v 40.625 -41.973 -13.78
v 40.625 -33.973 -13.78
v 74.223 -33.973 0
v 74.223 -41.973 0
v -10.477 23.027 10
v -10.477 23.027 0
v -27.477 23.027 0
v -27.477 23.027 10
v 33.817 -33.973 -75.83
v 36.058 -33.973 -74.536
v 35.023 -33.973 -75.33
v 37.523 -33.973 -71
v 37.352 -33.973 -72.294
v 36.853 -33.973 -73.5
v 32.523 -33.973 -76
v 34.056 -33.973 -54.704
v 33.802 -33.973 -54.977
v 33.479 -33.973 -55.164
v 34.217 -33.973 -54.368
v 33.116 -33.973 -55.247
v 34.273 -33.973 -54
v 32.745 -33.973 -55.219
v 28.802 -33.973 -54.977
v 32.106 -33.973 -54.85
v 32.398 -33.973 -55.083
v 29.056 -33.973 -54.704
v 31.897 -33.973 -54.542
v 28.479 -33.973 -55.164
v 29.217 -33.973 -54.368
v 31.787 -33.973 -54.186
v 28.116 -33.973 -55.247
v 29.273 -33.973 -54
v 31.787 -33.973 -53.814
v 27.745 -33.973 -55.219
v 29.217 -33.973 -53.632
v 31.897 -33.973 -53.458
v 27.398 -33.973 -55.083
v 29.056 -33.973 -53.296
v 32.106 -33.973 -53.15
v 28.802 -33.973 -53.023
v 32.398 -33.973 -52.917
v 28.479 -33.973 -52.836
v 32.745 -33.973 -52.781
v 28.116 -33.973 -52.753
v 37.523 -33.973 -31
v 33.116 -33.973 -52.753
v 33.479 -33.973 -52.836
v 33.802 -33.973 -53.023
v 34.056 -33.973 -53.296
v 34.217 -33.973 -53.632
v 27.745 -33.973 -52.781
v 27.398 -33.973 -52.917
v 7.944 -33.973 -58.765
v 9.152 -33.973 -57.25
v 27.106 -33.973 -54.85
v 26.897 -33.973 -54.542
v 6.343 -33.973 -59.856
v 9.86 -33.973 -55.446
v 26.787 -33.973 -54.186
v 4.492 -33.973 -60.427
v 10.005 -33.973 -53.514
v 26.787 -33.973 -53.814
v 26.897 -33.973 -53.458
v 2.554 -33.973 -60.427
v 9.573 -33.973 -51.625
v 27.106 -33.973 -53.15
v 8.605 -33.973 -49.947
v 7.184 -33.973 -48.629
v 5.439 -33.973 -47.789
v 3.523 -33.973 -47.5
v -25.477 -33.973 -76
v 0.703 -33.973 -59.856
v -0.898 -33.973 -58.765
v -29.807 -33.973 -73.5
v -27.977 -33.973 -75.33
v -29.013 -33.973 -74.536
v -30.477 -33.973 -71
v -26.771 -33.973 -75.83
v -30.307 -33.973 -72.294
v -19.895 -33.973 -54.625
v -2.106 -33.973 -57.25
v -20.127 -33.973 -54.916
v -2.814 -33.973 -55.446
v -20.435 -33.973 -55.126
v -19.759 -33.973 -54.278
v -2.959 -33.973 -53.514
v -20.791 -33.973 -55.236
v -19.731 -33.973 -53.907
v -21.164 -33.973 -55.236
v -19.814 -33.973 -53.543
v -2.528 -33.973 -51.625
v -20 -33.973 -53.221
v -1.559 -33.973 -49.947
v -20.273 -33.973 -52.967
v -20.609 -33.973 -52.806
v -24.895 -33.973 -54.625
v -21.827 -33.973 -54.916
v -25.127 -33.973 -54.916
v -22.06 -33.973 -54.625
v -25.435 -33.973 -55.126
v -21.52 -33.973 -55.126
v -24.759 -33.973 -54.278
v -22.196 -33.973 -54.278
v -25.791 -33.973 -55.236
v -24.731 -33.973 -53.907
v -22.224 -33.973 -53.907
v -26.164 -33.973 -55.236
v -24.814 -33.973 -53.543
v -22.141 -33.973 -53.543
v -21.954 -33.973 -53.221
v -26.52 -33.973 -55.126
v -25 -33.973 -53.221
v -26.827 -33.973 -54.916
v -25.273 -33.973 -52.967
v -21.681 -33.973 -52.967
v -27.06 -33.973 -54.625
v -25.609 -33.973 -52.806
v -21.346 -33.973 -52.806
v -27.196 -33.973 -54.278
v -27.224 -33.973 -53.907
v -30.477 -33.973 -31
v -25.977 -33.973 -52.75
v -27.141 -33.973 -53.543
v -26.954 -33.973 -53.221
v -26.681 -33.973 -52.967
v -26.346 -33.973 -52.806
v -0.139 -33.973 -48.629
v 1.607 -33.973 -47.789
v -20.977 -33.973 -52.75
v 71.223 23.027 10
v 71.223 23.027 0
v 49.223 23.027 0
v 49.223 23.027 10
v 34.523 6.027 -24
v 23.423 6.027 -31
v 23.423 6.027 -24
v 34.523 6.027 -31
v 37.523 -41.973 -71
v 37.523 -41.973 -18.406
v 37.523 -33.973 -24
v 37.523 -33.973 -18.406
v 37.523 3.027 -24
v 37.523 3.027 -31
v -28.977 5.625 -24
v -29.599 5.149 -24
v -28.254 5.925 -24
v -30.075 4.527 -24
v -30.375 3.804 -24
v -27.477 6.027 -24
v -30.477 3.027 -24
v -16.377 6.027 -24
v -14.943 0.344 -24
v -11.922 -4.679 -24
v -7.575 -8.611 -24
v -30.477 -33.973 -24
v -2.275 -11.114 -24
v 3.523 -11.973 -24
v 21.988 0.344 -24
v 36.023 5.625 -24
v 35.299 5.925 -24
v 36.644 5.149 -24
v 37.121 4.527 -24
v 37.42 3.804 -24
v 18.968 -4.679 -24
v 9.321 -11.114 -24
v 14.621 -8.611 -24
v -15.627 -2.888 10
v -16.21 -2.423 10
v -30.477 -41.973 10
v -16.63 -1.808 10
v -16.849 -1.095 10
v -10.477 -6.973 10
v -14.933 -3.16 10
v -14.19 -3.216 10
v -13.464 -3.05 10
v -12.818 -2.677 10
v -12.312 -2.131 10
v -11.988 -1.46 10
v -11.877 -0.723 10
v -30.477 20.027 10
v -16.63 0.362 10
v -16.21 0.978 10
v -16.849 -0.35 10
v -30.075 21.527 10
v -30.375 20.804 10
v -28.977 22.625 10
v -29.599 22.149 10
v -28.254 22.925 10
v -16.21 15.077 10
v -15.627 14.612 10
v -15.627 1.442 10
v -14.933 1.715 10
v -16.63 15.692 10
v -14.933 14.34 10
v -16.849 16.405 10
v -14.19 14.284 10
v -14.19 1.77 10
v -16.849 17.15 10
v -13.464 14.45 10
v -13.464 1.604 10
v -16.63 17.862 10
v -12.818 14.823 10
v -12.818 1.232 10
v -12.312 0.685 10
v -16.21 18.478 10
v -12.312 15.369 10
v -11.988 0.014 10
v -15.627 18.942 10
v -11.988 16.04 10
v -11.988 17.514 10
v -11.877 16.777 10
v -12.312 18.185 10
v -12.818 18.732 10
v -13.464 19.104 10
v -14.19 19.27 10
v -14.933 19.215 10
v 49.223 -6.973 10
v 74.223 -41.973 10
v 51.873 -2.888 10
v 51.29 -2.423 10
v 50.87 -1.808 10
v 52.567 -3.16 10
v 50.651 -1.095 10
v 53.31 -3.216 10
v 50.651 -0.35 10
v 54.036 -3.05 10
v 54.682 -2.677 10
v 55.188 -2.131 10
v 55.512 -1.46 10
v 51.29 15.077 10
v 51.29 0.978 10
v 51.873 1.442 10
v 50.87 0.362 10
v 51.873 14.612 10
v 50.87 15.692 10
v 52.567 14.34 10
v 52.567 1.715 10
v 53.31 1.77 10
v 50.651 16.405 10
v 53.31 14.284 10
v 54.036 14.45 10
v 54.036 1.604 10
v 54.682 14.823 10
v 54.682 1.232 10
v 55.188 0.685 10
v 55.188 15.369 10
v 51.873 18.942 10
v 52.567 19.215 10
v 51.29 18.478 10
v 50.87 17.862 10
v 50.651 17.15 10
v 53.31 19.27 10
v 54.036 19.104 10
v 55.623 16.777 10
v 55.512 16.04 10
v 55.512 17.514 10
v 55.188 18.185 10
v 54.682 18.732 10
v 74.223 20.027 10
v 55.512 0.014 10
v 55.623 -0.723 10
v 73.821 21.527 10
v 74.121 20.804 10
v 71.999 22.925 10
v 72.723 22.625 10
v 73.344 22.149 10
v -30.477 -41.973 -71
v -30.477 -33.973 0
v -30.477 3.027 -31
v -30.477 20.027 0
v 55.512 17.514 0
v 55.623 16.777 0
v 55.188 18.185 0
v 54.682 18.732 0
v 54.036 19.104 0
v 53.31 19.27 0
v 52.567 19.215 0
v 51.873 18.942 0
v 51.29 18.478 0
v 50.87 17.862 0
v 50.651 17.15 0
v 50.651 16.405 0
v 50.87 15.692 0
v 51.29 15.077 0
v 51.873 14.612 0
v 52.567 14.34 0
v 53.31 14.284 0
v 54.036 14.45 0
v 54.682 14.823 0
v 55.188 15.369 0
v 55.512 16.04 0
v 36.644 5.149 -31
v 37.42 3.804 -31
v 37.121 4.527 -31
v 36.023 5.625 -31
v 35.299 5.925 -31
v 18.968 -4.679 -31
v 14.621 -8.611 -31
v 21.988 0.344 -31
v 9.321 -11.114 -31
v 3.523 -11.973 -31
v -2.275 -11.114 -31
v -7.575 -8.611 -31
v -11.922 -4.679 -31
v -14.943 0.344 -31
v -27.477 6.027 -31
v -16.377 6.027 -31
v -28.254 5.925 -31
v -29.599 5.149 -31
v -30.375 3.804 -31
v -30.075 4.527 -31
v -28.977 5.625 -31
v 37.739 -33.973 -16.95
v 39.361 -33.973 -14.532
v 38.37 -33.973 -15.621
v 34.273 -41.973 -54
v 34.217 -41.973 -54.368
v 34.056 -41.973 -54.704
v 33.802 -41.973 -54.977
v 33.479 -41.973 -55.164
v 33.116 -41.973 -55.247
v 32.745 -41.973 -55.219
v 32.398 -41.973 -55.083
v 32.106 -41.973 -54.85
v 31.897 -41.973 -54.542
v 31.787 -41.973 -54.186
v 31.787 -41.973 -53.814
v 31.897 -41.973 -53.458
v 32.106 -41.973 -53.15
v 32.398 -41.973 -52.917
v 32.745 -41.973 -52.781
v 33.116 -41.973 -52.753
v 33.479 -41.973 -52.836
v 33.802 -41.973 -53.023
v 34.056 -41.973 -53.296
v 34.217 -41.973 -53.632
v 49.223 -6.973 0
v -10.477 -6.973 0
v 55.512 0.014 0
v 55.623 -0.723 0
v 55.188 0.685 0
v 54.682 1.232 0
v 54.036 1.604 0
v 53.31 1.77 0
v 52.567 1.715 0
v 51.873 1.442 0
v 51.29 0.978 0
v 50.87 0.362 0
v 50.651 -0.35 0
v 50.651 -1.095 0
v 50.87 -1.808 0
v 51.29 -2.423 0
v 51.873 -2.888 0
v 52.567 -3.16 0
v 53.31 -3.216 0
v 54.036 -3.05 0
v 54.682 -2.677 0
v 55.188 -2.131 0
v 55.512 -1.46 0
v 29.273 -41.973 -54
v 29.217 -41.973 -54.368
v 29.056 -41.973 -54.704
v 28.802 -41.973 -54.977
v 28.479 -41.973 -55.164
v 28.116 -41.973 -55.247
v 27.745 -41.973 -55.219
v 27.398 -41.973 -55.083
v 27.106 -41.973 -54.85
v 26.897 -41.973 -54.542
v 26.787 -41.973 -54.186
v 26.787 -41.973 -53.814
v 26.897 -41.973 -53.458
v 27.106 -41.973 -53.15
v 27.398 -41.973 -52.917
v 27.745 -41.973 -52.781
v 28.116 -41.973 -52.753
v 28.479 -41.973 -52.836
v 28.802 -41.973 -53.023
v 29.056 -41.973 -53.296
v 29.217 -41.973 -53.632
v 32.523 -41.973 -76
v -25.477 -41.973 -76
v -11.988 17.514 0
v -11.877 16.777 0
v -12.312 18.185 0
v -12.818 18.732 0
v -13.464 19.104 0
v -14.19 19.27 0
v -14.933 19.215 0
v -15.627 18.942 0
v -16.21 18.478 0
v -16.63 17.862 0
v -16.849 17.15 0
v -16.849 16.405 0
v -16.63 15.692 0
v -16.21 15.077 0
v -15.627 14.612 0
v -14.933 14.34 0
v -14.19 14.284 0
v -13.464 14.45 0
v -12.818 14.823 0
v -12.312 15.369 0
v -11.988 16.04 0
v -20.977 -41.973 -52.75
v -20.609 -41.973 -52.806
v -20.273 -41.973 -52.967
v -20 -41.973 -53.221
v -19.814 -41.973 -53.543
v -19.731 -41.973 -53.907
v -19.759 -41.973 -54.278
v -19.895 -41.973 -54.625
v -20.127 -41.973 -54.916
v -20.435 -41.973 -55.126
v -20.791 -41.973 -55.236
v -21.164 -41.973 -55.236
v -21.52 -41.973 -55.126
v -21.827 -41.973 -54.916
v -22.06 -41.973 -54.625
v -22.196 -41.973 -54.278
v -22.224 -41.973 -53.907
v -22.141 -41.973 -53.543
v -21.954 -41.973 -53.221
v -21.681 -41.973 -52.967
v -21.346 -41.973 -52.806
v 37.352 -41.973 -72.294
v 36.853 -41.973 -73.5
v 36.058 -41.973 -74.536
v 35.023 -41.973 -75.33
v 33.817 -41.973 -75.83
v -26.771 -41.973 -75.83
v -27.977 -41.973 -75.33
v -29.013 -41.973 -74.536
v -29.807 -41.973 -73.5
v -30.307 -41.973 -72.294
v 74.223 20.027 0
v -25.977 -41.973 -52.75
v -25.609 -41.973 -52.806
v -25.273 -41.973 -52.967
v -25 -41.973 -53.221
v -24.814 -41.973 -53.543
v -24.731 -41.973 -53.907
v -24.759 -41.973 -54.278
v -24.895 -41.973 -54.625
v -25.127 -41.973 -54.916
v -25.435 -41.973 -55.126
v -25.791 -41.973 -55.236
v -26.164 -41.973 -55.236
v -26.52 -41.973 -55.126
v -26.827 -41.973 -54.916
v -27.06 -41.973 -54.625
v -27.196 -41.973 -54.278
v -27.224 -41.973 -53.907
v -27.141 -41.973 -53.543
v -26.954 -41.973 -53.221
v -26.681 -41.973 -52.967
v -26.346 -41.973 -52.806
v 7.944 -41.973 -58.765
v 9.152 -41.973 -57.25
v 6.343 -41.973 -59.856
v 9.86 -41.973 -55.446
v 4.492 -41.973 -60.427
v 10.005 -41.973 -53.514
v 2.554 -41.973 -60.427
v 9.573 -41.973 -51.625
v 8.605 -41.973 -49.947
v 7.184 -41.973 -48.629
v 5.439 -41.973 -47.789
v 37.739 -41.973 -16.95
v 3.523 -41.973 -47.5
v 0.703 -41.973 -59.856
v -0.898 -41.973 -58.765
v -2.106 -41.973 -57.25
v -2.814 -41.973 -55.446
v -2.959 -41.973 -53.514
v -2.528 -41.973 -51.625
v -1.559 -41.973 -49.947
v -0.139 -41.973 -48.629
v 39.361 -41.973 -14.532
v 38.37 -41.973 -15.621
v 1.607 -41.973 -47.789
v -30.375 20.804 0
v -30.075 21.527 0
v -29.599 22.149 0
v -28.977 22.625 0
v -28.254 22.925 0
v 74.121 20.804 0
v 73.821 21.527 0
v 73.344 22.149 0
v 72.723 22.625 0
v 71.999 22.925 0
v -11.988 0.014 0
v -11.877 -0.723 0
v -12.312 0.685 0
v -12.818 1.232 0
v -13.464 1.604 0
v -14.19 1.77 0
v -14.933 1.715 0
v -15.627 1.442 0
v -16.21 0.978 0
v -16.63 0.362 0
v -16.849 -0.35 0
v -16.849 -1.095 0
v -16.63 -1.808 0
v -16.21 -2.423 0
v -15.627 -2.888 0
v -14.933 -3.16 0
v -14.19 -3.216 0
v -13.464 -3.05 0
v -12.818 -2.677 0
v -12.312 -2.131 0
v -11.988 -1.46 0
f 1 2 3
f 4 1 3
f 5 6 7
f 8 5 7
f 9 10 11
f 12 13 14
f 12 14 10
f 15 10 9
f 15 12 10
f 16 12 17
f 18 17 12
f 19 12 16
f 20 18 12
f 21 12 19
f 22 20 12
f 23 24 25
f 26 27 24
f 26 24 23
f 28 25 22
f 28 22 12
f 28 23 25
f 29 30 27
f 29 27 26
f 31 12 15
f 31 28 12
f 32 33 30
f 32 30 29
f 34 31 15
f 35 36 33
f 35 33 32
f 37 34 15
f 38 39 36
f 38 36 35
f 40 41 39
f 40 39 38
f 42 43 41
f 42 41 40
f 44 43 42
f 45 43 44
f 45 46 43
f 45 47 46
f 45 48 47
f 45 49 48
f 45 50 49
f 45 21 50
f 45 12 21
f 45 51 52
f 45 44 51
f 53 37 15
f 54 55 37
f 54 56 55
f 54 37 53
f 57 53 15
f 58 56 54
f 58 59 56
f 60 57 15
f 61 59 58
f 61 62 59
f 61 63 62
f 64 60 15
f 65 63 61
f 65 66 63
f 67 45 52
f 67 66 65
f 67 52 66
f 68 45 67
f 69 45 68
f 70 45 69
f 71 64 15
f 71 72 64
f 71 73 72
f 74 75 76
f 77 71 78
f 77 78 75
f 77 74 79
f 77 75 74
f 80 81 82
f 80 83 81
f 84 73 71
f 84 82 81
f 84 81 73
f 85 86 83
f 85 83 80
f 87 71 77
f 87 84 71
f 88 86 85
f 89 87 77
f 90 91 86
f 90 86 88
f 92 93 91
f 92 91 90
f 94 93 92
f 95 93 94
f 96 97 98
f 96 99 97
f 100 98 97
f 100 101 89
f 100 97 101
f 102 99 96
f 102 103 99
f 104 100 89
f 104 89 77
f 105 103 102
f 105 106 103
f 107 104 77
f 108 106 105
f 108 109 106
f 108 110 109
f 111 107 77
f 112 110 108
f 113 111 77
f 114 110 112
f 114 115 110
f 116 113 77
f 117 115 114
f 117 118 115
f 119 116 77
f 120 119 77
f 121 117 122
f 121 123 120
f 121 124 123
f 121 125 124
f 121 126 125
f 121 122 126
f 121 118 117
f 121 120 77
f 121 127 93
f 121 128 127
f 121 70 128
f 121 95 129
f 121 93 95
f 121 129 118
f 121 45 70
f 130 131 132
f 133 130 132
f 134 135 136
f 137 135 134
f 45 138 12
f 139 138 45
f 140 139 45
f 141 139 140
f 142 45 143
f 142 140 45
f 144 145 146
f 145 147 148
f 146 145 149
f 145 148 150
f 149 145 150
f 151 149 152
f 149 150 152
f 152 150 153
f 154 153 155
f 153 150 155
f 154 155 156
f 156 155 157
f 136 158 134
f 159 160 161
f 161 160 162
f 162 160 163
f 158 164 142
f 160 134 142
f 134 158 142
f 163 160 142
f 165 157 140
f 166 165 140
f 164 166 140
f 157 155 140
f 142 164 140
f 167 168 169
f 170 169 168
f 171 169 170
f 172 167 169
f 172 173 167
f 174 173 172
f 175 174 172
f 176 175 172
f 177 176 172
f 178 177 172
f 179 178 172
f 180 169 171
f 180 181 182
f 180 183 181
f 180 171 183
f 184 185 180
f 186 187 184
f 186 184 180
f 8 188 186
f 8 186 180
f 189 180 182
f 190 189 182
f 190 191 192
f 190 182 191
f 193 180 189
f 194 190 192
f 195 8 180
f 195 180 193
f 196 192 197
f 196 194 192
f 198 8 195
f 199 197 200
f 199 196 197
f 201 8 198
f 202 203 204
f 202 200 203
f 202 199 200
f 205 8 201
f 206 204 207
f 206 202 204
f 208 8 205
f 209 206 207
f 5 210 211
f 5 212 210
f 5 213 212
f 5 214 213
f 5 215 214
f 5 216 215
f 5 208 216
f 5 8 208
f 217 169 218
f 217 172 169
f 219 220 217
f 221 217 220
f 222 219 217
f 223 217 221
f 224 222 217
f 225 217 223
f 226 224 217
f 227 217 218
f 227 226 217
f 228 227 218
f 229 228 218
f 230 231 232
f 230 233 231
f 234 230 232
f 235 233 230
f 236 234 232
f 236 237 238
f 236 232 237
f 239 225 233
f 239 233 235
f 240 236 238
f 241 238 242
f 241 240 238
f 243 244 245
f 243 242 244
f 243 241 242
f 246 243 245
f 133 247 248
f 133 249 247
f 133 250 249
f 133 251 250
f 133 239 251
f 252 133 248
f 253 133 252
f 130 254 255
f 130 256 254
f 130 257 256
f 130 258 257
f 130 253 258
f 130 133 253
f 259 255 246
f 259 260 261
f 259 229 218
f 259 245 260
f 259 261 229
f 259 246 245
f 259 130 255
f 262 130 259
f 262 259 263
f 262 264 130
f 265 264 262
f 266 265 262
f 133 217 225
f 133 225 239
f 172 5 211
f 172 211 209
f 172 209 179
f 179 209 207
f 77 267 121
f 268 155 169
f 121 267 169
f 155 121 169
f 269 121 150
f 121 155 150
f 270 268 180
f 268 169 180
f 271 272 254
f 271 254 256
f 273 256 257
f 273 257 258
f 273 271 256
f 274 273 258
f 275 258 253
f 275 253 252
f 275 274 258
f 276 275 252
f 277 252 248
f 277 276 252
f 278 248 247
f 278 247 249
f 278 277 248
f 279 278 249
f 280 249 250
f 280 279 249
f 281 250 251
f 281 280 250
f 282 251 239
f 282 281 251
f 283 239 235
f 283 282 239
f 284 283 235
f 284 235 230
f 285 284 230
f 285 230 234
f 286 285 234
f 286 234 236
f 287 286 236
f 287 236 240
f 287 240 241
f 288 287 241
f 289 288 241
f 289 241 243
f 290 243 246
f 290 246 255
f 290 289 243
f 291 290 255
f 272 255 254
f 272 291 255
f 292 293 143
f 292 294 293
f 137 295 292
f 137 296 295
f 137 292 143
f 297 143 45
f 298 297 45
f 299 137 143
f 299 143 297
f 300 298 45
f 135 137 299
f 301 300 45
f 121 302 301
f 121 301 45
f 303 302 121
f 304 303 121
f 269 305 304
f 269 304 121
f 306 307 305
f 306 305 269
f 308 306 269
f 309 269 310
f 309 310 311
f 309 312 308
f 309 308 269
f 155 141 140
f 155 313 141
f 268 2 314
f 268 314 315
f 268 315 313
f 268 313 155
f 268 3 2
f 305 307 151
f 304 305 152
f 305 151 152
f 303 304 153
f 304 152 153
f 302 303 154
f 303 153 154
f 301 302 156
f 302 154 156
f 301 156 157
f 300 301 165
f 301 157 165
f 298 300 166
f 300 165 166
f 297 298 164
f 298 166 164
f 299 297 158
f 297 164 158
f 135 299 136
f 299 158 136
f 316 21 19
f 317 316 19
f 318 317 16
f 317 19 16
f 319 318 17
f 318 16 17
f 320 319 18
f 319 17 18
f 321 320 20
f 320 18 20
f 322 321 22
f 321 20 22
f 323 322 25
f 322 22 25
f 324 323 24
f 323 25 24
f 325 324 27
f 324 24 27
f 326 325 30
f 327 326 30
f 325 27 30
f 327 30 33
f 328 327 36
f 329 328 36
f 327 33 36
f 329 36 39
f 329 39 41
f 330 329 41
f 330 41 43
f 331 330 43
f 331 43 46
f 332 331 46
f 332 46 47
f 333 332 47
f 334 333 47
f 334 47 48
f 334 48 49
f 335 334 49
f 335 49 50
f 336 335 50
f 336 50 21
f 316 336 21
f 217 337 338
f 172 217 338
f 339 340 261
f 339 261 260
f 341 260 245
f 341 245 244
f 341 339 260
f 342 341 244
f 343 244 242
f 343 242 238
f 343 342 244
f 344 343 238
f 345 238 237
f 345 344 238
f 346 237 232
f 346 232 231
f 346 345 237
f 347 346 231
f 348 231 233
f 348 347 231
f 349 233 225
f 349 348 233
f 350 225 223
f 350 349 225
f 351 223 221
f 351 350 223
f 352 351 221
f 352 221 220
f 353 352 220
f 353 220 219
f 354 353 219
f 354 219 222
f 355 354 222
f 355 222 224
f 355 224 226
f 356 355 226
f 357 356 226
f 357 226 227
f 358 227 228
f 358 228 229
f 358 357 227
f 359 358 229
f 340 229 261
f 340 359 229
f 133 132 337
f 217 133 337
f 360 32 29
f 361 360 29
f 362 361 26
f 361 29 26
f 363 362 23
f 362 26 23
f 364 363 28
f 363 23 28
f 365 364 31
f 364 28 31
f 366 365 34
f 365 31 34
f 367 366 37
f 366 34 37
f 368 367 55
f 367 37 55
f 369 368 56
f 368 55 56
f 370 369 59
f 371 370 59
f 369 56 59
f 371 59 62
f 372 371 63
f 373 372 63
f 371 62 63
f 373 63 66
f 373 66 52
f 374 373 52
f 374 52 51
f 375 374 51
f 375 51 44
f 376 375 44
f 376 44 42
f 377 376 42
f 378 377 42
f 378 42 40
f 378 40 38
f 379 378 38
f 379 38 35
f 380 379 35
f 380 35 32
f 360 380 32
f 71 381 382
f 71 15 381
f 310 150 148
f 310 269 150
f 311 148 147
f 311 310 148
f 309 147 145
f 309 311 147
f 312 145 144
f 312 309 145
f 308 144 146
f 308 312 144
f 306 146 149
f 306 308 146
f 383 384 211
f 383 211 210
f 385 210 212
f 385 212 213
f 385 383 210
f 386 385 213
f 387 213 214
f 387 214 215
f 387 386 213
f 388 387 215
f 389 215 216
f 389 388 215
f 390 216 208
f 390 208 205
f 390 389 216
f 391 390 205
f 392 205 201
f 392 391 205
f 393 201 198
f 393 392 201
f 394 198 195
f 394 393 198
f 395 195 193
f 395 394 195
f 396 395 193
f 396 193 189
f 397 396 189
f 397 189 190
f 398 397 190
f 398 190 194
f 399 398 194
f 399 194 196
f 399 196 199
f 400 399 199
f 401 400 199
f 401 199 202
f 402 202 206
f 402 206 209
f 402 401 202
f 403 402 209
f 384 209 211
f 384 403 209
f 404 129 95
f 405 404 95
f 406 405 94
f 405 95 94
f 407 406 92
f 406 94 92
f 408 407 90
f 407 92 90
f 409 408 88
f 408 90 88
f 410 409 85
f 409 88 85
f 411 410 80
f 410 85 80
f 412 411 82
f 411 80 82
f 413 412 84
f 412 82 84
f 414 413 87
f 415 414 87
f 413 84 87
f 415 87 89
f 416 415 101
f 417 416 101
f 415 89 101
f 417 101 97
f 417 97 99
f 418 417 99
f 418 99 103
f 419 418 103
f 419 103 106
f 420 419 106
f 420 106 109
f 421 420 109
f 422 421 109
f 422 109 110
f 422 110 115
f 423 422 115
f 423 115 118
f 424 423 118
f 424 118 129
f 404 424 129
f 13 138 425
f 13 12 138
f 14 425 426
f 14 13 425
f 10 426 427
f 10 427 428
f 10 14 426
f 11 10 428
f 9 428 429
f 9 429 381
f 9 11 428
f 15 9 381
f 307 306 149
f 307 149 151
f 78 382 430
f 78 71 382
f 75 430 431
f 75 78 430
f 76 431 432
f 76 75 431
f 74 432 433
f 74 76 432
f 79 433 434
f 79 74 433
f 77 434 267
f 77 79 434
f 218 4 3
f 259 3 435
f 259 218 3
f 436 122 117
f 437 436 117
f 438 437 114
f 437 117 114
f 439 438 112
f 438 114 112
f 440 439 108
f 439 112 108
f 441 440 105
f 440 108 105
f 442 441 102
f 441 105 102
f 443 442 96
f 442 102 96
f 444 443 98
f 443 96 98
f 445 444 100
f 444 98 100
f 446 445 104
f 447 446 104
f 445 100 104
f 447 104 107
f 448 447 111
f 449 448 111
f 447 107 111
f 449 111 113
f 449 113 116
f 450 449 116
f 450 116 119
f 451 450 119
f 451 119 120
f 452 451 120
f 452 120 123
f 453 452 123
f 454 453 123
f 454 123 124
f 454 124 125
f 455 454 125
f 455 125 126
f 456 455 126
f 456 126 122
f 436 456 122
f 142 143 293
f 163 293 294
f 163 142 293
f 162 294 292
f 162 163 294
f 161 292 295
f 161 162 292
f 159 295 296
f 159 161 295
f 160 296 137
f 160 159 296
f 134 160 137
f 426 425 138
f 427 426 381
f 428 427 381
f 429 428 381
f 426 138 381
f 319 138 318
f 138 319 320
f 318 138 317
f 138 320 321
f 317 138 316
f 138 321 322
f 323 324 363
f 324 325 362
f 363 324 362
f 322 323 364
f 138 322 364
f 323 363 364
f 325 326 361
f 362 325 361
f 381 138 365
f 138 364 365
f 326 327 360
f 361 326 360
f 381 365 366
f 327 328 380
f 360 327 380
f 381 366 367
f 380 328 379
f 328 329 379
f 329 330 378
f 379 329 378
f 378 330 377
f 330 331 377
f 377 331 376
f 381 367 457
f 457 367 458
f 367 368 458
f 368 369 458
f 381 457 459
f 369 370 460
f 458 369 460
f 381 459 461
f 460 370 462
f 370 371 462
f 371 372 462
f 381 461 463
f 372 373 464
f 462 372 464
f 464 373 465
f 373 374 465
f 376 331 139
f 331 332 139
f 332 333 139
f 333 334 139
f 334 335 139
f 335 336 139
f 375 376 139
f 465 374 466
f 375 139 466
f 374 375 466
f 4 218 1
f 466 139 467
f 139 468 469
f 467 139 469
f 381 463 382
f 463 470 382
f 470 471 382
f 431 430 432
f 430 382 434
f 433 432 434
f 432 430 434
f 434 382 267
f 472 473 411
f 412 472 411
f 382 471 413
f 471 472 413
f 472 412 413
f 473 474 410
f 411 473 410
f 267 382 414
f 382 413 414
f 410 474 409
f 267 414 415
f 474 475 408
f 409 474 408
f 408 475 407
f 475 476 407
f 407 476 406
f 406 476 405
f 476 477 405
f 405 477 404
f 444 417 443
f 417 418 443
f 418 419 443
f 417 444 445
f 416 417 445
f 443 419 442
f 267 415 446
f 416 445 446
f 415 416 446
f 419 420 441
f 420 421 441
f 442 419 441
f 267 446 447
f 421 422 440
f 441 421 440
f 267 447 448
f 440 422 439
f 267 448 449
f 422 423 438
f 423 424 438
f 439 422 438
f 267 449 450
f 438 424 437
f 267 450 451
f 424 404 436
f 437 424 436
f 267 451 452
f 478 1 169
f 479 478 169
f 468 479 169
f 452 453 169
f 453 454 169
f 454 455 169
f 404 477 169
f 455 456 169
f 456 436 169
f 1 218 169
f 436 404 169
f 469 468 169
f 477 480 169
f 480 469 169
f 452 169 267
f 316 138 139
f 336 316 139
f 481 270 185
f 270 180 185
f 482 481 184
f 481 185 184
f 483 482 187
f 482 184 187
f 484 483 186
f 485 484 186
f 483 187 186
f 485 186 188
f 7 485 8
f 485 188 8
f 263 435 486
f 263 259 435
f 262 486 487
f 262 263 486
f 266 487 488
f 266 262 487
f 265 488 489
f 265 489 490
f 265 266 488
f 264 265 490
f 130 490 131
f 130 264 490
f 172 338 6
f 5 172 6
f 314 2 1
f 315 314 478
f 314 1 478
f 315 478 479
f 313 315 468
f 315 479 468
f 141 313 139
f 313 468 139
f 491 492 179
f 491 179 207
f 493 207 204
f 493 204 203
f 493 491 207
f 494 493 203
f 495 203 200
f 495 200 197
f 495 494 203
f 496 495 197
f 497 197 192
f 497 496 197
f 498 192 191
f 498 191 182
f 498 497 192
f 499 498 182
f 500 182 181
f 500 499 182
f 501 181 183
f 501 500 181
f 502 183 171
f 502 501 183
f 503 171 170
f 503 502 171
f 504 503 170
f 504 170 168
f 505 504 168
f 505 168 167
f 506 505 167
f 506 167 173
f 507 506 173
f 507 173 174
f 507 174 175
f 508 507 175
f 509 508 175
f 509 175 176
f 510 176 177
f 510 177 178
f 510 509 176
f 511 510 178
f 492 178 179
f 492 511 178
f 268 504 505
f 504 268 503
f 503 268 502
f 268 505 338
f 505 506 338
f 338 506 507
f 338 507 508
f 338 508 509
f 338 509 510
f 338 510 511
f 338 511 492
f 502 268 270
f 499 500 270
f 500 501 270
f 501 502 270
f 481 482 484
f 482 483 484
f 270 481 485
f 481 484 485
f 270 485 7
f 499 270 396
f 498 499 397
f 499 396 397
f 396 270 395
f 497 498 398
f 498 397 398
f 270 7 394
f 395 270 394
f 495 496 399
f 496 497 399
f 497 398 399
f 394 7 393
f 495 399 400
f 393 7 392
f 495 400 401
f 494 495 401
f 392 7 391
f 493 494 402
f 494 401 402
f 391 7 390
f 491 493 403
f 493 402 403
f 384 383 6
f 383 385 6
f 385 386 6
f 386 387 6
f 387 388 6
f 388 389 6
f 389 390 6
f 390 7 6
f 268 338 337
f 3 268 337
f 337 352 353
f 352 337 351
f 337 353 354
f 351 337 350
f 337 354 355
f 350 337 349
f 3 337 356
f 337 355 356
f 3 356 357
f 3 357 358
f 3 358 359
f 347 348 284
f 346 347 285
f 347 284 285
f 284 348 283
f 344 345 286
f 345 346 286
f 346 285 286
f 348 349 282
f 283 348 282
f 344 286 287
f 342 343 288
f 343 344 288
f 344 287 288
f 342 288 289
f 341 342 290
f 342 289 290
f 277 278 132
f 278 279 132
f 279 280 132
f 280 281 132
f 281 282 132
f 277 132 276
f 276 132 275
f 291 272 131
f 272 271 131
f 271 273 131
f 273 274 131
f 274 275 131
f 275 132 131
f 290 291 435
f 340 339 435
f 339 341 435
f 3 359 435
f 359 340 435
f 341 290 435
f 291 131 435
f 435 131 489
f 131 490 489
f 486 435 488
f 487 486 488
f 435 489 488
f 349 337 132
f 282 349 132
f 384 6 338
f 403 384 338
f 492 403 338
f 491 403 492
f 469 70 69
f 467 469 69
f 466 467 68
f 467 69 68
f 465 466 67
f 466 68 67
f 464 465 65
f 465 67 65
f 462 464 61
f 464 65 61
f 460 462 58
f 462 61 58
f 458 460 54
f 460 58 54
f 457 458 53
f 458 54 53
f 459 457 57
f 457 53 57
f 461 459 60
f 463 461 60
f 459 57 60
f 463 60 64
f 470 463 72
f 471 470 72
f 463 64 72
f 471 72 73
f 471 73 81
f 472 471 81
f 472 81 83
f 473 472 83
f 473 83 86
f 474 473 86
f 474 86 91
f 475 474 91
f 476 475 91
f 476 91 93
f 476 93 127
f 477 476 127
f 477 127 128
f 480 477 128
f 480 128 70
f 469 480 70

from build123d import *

# Parameters (mm, degrees)
CROQUIS1_R              = 2.5
SALIENTE_EXTRUIR2_DEPTH = 10
CROQUIS3_W              = 104.7
CROQUIS3_H              = 8
SALIENTE_EXTRUIR3_DEPTH = 45
CROQUIS4_W              = 104.7
CROQUIS4_H              = 7
SALIENTE_EXTRUIR4_DEPTH = 40
CROQUIS6_R              = 20
CORTAR_EXTRUIR1_DEPTH   = 92.797287028
REDONDEO2_R             = 3
CORTAR_EXTRUIR3_DEPTH   = 100.186815901
CROQUIS12_W             = 67.999748742
CROQUIS12_H             = 7
CORTAR_EXTRUIR4_DEPTH   = 104.841342675
REDONDEO5_R             = 5
CROQUIS13_W             = 67.999748742
CROQUIS13_H             = 8
CORTAR_EXTRUIR6_DEPTH   = 7
CROQUIS18_W             = 67.999748742
CROQUIS18_H             = 8
SALIENTE_EXTRUIR7_DEPTH = 45
CORTAR_EXTRUIR7_REACH   = 122.557
CROQUIS19_R             = 1.25
CROQUIS19_R_2           = 6.5
REDONDEO8_R             = 5
REDONDEO10_R            = 3


with BuildPart() as part:
    # Croquis1 → Saliente-Extruir2 (new body)
    with BuildSketch(Plane.XY):
        Polygon((74.222802753, 23.027181924), (49.222802753, 23.027181924), (49.222802753, -6.972818076), (-10.477197247, -6.972818076), (-10.477197247, 23.027181924), (-30.477197247, 23.027181924), (-30.477197247, -41.972818076), (74.222802753, -41.972818076), align=None)
        with Locations((-14.377197247, 16.777181924)):
            Circle(CROQUIS1_R, mode=Mode.SUBTRACT)
        with Locations((-14.377197247, -0.722818076)):
            Circle(CROQUIS1_R, mode=Mode.SUBTRACT)
        with Locations((53.122802753, 16.777181924)):
            Circle(CROQUIS1_R, mode=Mode.SUBTRACT)
        with Locations((53.122802753, -0.722818076)):
            Circle(CROQUIS1_R, mode=Mode.SUBTRACT)
    extrude(amount=SALIENTE_EXTRUIR2_DEPTH)

    # Croquis3 → Saliente-Extruir3 (add)
    with BuildSketch(Plane(origin=(0, 0, 0), x_dir=(-1, 0, 0), z_dir=(0, 0, -1))):
        with Locations((-21.872802753, -37.972818076)):
            Rectangle(CROQUIS3_W, CROQUIS3_H)
    extrude(amount=SALIENTE_EXTRUIR3_DEPTH)

    # Croquis4 → Saliente-Extruir4 (add)
    with BuildSketch(Plane(origin=(0, -33.972818076, 0), x_dir=(1, 0, 0), z_dir=(0, 1, 0))):
        with Locations((21.872802753, 27.5)):
            Rectangle(CROQUIS4_W, CROQUIS4_H)
    extrude(amount=SALIENTE_EXTRUIR4_DEPTH)

    # Croquis6 → Cortar-Extruir1 (cut, through all)
    with BuildSketch(Plane.XY.offset(-24)):
        with Locations((3.522802753, 8.027181924)):
            Circle(CROQUIS6_R)
    extrude(amount=-CORTAR_EXTRUIR1_DEPTH, mode=Mode.SUBTRACT)

    # Redondeo2
    redondeo2_edges = [part.edges().sort_by_distance(p)[0] for p in [
        (74.222802753, 23.027181924, 5),
        (-30.477197247, 23.027181924, 5),
    ]]
    fillet(redondeo2_edges, radius=REDONDEO2_R)

    # Croquis10 → Cortar-Extruir3 (cut, through all)
    with BuildSketch(Plane(origin=(0, 6.027181924, 0), x_dir=(1, 0, 0), z_dir=(0, 1, 0))):
        Polygon((74.222802753, 45), (37.522551495, 45), (37.522551495, 15.052232973), (74.222802753, 0), align=None)
    extrude(amount=-CORTAR_EXTRUIR3_DEPTH, mode=Mode.SUBTRACT)

    # Croquis12 → Cortar-Extruir4 (cut, through all)
    with BuildSketch(Plane(origin=(0, -33.972818076, 0), x_dir=(1, 0, 0), z_dir=(0, 1, 0))):
        with Locations((3.522677124, 41.5)):
            Rectangle(CROQUIS12_W, CROQUIS12_H)
    extrude(amount=-CORTAR_EXTRUIR4_DEPTH, mode=Mode.SUBTRACT)

    # Redondeo5
    redondeo5_edges = [part.edges().sort_by_distance(p)[0] for p in [
        (37.522551495, -37.972818076, -15.052232973),
    ]]
    fillet(redondeo5_edges, radius=REDONDEO5_R)

    # Croquis13 → Cortar-Extruir6 (cut)
    with BuildSketch(Plane(origin=(0, 0, -38), x_dir=(-1, 0, 0), z_dir=(0, 0, -1))):
        with Locations((-3.522677124, -37.972818076)):
            Rectangle(CROQUIS13_W, CROQUIS13_H)
    extrude(amount=-CORTAR_EXTRUIR6_DEPTH, mode=Mode.SUBTRACT)

    # Croquis18 → Saliente-Extruir7 (add)
    with BuildSketch(Plane(origin=(0, 0, -31), x_dir=(-1, 0, 0), z_dir=(0, 0, -1))):
        with Locations((-3.522677124, -37.972818076)):
            Rectangle(CROQUIS18_W, CROQUIS18_H)
    extrude(amount=SALIENTE_EXTRUIR7_DEPTH)

    # Croquis19 → Cortar-Extruir7 (cut, up to next)
    with BuildSketch(Plane(origin=(0, -33.972818076, 0), x_dir=(1, 0, 0), z_dir=(0, 1, 0)), mode=Mode.PRIVATE) as cortar_extruir7_sk1:
        with Locations(Location((-25.977197247, 54, 0), (0, 0, 270))):
            Circle(CROQUIS19_R)
    cortar_extruir7_tool1 = extrude(cortar_extruir7_sk1.sketch, amount=-CORTAR_EXTRUIR7_REACH, mode=Mode.PRIVATE) & part.part
    # Croquis19 → Cortar-Extruir7 (cut, up to next)
    with BuildSketch(Plane(origin=(0, -33.972818076, 0), x_dir=(1, 0, 0), z_dir=(0, 1, 0)), mode=Mode.PRIVATE) as cortar_extruir7_sk2:
        with Locations((33.022802753, 54)):
            Circle(CROQUIS19_R)
    cortar_extruir7_tool2 = extrude(cortar_extruir7_sk2.sketch, amount=-CORTAR_EXTRUIR7_REACH, mode=Mode.PRIVATE) & part.part
    # Croquis19 → Cortar-Extruir7 (cut, up to next)
    with BuildSketch(Plane(origin=(0, -33.972818076, 0), x_dir=(1, 0, 0), z_dir=(0, 1, 0)), mode=Mode.PRIVATE) as cortar_extruir7_sk3:
        with Locations(Location((-20.977197247, 54, 0), (0, 0, 270))):
            Circle(CROQUIS19_R)
    cortar_extruir7_tool3 = extrude(cortar_extruir7_sk3.sketch, amount=-CORTAR_EXTRUIR7_REACH, mode=Mode.PRIVATE) & part.part
    # Croquis19 → Cortar-Extruir7 (cut, up to next)
    with BuildSketch(Plane(origin=(0, -33.972818076, 0), x_dir=(1, 0, 0), z_dir=(0, 1, 0)), mode=Mode.PRIVATE) as cortar_extruir7_sk4:
        with Locations((28.022802753, 54)):
            Circle(CROQUIS19_R)
    cortar_extruir7_tool4 = extrude(cortar_extruir7_sk4.sketch, amount=-CORTAR_EXTRUIR7_REACH, mode=Mode.PRIVATE) & part.part
    # Croquis19 → Cortar-Extruir7 (cut, up to next)
    with BuildSketch(Plane(origin=(0, -33.972818076, 0), x_dir=(1, 0, 0), z_dir=(0, 1, 0)), mode=Mode.PRIVATE) as cortar_extruir7_sk5:
        with Locations(Location((3.522802753, 54, 0), (0, 0, 270))):
            Circle(CROQUIS19_R_2)
    cortar_extruir7_tool5 = extrude(cortar_extruir7_sk5.sketch, amount=-CORTAR_EXTRUIR7_REACH, mode=Mode.PRIVATE) & part.part
    add(cortar_extruir7_tool1.solids().sort_by_distance((-25.977197, -33.972818, -54))[0], mode=Mode.SUBTRACT)
    add(cortar_extruir7_tool2.solids().sort_by_distance((33.022803, -33.972818, -54))[0], mode=Mode.SUBTRACT)
    add(cortar_extruir7_tool3.solids().sort_by_distance((-20.977197, -33.972818, -54))[0], mode=Mode.SUBTRACT)
    add(cortar_extruir7_tool4.solids().sort_by_distance((28.022803, -33.972818, -54))[0], mode=Mode.SUBTRACT)
    add(cortar_extruir7_tool5.solids().sort_by_distance((3.522803, -33.972818, -54))[0], mode=Mode.SUBTRACT)

    # Redondeo8
    redondeo8_edges = [part.edges().sort_by_distance(p)[0] for p in [
        (37.522551495, -37.972818076, -76),
        (-30.477197247, -37.972818076, -76),
    ]]
    fillet(redondeo8_edges, radius=REDONDEO8_R)

    # Redondeo10
    redondeo10_edges = [part.edges().sort_by_distance(p)[0] for p in [
        (-30.477197247, 6.027181924, -27.5),
        (37.522551495, 6.027181924, -27.5),
    ]]
    fillet(redondeo10_edges, radius=REDONDEO10_R)


solid = part.part
